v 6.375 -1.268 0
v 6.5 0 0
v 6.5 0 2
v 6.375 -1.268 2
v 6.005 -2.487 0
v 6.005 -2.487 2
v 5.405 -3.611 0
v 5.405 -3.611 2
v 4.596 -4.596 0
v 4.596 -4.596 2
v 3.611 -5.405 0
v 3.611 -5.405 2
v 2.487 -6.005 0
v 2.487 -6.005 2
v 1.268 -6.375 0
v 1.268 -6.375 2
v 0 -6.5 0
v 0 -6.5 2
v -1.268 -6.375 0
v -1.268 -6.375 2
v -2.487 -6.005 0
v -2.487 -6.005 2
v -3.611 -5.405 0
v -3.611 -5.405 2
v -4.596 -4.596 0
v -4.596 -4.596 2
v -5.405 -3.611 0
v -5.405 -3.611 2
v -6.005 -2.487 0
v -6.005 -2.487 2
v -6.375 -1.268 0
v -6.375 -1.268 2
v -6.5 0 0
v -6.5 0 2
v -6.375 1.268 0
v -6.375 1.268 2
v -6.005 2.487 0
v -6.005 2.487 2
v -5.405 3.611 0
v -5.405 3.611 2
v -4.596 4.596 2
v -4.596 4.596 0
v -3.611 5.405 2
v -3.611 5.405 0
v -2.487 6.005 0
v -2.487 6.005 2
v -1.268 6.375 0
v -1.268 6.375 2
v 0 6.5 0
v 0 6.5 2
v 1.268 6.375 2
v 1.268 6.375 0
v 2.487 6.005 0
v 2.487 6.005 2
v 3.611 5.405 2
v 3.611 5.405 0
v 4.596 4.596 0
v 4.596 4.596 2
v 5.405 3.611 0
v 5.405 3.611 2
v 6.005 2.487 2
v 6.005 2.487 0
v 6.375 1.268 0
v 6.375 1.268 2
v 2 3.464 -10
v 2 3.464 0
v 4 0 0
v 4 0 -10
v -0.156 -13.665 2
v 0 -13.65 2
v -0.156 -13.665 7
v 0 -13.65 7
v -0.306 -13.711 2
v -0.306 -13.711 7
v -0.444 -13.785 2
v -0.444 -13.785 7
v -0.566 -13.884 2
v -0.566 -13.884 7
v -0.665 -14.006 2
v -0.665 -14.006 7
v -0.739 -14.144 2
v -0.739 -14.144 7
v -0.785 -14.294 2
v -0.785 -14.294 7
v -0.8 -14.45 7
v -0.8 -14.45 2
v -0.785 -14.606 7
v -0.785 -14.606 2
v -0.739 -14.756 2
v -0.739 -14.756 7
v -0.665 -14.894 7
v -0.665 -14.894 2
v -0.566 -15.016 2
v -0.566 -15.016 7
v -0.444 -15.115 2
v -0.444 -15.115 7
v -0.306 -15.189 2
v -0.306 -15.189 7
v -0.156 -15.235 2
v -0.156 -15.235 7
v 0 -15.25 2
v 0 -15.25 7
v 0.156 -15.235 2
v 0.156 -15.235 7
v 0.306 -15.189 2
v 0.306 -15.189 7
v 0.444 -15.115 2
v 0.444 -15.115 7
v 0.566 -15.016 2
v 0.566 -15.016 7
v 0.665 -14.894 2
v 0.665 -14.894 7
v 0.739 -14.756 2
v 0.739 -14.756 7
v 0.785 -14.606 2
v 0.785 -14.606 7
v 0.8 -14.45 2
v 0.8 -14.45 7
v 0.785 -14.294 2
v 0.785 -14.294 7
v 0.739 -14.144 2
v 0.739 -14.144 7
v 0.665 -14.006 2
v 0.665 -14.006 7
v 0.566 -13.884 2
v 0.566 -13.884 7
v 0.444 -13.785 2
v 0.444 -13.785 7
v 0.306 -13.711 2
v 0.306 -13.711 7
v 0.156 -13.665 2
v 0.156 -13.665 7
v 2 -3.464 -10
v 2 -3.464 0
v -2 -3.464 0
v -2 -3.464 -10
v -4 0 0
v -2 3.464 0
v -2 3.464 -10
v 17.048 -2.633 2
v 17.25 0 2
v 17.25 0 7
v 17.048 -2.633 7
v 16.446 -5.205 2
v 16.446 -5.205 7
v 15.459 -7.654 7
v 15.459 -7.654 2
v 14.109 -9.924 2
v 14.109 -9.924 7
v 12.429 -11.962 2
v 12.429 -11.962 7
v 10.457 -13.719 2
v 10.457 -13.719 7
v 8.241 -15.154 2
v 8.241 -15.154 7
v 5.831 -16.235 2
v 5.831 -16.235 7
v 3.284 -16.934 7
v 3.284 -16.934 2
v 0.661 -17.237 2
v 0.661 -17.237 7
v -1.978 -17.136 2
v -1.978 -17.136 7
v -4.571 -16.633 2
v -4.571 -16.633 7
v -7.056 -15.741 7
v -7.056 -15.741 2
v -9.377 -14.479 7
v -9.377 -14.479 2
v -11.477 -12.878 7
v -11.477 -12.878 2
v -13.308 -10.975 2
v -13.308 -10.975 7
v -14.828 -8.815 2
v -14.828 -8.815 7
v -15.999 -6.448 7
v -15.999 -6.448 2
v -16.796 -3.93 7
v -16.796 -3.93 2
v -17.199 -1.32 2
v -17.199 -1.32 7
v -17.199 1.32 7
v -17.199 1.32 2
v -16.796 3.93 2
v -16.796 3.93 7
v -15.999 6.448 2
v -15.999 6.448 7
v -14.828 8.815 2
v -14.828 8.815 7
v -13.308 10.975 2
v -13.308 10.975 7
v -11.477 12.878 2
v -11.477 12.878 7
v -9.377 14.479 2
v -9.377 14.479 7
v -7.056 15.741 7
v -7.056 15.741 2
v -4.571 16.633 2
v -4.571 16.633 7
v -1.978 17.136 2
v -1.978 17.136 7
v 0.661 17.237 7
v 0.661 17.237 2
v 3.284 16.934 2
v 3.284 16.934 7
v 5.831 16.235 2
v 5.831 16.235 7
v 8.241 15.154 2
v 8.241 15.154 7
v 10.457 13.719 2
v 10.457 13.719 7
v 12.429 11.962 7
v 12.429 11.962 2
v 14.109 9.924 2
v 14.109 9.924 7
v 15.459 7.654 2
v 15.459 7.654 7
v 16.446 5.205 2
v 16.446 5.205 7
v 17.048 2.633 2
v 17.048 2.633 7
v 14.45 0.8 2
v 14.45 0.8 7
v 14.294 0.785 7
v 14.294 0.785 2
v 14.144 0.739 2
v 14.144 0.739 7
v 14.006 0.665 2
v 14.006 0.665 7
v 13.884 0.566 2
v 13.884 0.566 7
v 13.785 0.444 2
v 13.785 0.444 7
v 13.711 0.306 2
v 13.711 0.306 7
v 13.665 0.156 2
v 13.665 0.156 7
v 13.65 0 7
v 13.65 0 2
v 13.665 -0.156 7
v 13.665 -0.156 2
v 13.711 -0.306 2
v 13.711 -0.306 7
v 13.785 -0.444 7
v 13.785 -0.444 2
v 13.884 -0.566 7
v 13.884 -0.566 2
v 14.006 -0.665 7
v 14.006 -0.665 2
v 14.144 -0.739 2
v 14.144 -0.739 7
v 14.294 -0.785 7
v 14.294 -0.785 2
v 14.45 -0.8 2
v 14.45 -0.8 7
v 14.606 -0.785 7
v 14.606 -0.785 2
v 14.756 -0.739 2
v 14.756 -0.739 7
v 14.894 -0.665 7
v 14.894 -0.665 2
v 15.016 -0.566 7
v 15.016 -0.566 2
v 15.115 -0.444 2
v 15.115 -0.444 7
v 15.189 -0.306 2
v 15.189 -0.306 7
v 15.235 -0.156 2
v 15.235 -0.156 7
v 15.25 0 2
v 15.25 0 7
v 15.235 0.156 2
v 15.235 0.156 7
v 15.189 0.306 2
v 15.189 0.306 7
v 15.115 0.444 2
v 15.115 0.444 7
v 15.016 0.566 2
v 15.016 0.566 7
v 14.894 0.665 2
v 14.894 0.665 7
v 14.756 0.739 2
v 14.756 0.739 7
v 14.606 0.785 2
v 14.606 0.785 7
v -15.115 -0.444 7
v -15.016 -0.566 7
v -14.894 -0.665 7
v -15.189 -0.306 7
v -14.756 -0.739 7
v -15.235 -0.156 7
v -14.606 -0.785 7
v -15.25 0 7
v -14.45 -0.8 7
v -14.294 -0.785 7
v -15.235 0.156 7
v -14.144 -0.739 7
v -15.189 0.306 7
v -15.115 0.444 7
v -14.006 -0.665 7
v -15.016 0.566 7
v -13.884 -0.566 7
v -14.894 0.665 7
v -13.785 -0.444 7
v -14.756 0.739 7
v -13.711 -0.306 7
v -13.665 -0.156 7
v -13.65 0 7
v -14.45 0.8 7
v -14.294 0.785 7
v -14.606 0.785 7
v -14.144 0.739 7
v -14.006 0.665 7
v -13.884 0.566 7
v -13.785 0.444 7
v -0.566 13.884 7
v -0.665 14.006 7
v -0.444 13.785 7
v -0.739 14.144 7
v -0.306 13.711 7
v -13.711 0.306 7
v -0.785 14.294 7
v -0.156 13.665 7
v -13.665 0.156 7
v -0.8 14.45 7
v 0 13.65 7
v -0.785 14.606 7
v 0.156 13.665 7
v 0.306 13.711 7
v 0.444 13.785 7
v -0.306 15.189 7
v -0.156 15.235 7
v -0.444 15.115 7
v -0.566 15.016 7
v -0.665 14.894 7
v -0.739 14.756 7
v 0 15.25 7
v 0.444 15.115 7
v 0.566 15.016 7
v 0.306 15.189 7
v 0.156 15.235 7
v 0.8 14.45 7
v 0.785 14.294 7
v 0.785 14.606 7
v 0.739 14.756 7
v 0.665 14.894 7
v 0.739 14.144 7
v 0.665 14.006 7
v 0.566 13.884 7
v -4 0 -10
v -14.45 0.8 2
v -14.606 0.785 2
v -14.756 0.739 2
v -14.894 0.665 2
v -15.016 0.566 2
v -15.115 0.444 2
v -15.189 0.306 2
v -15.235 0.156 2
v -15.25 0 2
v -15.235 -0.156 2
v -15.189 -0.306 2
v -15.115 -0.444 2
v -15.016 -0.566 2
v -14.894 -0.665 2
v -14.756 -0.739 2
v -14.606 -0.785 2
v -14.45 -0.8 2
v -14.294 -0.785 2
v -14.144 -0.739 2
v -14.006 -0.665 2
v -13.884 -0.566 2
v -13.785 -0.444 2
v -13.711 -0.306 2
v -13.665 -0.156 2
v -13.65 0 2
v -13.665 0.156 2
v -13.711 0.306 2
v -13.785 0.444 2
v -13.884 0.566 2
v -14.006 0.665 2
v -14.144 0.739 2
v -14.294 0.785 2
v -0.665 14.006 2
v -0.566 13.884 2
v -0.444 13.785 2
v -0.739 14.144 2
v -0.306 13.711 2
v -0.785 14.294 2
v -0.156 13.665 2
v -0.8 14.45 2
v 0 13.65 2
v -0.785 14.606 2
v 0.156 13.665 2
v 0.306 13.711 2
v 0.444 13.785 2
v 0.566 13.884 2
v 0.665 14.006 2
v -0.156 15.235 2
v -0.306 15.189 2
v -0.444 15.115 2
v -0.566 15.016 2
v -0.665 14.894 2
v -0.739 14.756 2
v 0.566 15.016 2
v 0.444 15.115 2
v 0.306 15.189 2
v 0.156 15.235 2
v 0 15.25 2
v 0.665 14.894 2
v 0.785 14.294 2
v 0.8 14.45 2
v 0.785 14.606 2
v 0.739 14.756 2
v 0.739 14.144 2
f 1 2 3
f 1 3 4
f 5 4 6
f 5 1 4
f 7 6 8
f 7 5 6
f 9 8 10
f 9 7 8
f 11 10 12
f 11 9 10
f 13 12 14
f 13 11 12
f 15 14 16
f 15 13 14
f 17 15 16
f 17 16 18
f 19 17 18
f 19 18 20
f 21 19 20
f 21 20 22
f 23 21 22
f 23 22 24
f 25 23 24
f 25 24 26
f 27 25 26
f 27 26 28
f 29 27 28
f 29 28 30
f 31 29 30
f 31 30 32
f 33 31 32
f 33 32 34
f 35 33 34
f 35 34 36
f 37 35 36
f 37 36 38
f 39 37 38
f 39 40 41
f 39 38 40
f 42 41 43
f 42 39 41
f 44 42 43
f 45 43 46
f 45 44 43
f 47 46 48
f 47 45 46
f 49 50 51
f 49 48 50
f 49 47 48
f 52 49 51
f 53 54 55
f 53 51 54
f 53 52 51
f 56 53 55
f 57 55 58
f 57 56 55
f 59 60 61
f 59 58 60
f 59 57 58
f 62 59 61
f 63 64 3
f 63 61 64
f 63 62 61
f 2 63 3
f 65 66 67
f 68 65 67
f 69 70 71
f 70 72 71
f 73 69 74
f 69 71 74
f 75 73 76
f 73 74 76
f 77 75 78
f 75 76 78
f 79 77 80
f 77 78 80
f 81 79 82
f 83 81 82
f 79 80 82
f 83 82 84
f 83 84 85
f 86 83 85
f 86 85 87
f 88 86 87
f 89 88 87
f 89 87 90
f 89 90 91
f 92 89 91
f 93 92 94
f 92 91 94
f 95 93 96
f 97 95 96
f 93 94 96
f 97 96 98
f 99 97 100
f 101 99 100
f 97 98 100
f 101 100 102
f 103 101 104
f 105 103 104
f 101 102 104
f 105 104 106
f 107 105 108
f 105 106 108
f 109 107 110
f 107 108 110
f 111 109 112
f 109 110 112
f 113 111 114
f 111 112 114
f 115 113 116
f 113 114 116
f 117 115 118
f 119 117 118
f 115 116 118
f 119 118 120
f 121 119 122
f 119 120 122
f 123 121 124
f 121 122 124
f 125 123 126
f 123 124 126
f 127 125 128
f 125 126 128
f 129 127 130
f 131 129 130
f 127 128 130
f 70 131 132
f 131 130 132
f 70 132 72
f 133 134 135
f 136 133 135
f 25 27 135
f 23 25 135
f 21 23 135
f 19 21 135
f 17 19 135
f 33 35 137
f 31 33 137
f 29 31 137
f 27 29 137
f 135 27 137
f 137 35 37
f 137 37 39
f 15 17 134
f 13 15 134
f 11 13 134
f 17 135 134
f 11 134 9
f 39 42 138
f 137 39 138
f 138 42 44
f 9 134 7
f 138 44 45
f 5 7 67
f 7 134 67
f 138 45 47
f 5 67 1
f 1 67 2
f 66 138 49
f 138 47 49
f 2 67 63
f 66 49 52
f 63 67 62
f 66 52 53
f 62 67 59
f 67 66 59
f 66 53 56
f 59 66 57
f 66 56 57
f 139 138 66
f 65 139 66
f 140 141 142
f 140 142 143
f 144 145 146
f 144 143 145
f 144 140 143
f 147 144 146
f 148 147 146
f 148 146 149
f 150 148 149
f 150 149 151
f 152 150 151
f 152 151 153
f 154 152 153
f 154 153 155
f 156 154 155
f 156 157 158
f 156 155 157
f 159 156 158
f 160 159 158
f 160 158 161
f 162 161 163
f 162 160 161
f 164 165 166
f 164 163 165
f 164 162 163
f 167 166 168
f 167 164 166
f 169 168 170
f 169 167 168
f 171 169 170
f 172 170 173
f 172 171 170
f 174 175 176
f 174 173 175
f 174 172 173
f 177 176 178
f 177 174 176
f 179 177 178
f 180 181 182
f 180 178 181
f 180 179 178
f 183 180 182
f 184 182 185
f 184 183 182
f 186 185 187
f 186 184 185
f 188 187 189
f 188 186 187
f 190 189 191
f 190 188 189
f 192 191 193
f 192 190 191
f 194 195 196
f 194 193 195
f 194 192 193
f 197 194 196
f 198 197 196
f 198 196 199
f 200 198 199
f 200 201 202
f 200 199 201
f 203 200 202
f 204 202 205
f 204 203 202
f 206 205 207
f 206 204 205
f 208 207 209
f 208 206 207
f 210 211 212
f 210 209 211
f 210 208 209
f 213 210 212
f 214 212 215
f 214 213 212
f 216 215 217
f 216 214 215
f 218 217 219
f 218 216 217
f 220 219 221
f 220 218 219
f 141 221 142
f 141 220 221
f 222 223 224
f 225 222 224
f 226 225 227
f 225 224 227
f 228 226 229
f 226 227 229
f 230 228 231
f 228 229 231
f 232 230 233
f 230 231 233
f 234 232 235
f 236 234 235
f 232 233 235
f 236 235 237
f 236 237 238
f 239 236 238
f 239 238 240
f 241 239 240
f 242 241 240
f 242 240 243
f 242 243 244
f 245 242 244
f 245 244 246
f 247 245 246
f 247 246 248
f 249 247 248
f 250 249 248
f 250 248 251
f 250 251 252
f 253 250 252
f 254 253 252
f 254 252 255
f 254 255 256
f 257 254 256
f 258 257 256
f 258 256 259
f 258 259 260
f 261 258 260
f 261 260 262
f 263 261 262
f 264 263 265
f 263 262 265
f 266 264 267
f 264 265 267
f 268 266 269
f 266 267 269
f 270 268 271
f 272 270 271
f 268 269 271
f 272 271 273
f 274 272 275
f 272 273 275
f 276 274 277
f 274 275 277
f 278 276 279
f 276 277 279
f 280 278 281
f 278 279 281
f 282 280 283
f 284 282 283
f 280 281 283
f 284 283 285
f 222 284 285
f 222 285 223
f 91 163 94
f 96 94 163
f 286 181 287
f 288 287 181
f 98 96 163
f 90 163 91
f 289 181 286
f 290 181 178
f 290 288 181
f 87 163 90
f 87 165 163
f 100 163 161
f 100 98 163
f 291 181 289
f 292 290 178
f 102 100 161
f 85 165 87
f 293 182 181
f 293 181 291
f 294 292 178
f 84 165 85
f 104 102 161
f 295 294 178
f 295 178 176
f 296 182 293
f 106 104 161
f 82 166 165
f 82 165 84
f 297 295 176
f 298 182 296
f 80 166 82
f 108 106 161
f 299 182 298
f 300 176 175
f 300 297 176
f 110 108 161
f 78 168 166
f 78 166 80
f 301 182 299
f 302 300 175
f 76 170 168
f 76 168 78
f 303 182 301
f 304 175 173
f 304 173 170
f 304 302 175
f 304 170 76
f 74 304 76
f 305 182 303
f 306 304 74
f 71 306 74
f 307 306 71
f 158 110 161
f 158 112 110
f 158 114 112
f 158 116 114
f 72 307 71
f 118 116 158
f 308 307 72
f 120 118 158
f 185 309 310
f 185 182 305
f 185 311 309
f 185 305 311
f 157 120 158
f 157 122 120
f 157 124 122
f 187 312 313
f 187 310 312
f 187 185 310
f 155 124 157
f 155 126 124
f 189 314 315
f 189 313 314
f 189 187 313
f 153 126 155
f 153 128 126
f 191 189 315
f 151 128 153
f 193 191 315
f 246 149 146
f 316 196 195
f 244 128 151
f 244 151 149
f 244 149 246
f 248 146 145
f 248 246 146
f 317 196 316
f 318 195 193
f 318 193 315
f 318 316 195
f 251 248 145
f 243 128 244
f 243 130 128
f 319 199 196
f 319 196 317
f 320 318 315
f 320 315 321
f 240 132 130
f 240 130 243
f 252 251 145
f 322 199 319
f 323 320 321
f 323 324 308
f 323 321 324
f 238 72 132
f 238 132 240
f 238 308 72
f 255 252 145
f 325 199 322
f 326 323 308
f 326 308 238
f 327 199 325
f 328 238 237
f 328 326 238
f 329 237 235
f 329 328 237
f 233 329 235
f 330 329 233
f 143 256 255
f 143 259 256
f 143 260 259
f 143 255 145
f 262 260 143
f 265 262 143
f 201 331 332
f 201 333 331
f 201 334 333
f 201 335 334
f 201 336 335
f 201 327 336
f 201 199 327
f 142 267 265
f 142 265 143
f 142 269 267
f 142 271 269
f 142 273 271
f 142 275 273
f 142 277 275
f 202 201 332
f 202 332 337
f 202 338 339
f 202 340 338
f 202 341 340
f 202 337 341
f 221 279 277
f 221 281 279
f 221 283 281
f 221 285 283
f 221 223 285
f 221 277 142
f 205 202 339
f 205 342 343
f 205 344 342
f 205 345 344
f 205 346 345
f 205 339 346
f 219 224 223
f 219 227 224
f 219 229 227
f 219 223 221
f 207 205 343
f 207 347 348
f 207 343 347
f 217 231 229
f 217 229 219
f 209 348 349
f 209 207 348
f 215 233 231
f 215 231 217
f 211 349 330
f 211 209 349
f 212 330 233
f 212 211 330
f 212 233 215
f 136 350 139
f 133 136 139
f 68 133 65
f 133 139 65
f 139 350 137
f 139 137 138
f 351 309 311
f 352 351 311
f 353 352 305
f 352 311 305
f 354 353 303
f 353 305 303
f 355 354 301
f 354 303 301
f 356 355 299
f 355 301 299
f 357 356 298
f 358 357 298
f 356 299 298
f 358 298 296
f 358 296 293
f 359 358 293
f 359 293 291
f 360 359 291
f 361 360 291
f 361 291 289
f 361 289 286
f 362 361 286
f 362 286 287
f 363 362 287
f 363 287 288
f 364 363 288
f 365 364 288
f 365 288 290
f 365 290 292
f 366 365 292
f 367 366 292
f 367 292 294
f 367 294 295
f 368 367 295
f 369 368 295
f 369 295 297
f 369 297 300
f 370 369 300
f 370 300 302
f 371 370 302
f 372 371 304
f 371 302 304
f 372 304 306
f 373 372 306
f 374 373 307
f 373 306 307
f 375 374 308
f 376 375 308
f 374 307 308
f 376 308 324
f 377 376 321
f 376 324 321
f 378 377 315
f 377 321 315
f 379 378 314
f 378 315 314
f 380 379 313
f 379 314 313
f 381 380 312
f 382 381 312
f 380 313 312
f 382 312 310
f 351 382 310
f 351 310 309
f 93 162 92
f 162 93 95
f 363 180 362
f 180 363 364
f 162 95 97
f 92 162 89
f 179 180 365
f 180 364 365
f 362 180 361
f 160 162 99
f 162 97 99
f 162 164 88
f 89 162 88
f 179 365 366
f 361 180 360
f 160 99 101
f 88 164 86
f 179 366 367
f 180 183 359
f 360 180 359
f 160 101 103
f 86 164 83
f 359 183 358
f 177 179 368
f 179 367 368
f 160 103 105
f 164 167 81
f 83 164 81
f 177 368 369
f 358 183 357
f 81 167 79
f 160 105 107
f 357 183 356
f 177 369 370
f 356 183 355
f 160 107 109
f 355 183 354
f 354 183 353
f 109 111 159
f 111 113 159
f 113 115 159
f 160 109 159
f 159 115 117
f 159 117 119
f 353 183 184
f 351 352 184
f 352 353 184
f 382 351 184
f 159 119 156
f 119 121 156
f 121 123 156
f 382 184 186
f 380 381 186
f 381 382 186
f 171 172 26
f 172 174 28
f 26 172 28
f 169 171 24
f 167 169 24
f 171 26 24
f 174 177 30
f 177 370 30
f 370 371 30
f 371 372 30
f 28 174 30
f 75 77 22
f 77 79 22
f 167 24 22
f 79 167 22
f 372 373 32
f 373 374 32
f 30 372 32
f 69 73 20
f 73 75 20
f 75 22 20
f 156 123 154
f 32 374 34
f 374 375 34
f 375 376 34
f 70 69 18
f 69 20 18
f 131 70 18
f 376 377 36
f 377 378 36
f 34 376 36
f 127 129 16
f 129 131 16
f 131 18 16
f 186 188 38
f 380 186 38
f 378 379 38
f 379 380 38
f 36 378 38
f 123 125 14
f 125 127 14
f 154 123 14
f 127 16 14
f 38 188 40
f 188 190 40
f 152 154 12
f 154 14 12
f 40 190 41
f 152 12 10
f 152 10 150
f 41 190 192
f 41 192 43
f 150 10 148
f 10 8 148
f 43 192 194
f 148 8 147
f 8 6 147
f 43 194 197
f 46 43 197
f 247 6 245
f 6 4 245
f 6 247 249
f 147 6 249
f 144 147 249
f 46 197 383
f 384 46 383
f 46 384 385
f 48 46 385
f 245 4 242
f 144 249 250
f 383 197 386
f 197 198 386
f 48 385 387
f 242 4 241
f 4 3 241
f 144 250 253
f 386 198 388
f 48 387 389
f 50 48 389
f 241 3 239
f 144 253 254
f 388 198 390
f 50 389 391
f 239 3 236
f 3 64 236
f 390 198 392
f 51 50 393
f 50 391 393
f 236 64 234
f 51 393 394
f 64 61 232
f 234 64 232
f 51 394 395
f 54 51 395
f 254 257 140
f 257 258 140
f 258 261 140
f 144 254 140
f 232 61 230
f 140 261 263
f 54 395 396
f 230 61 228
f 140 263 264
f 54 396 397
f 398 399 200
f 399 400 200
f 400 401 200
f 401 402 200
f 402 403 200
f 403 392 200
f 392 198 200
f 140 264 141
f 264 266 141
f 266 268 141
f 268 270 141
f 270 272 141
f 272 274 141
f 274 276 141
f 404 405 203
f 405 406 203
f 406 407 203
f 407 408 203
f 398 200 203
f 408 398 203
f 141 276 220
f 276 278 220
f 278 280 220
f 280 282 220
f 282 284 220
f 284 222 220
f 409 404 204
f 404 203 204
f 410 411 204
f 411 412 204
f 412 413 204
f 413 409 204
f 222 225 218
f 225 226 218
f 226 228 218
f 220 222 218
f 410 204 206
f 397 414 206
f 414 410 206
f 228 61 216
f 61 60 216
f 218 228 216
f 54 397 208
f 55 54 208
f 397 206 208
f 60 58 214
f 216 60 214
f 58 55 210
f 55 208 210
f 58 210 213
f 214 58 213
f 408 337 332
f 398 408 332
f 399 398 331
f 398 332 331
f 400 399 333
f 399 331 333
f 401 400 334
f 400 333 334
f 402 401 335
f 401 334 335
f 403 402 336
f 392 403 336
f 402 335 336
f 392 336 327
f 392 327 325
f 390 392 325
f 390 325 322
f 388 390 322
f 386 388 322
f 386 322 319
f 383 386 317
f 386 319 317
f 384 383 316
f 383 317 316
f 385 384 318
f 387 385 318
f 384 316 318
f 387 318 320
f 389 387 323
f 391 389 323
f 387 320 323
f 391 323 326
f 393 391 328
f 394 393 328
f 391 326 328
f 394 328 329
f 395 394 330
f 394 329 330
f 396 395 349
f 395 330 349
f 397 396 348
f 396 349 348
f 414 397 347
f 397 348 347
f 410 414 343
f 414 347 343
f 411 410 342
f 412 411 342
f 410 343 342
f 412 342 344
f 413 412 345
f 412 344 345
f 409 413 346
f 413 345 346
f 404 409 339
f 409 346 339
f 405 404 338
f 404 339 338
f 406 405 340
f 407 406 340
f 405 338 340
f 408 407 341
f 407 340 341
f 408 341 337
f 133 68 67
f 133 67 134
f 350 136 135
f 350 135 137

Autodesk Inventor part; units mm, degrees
ref_plane "YZ Plane" through (0, 0, 0) normal (1, 0, 0) x (0, 1, 0)
ref_plane "XZ Plane" through (0, 0, 0) normal (0, 1, 0) x (-1, 0, 0)
sketch "Sketch1" plane through (0, 0, 0) normal (0, 0, 1) x (1, 0, 0)
  line L0 (-2, 3.4641) -> (2, 3.4641) projected
  line L1 (-4, 0) -> (-2, 3.4641) projected
  line L2 (-2, -3.4641) -> (-4, 0) projected
  line L3 (2, -3.4641) -> (-2, -3.4641) projected
  line L4 (4, 0) -> (2, -3.4641) projected
  line L5 (2, 3.4641) -> (4, 0) projected
  line L6 (-4, 0) -> (-2, 3.4641) projected
  line L7 (-2, 3.4641) -> (2, 3.4641) projected
  line L8 (2, 3.4641) -> (4, 0) projected
  line L9 (4, 0) -> (2, -3.4641) projected
  line L10 (2, -3.4641) -> (-2, -3.4641) projected
  line L11 (-2, -3.4641) -> (-4, 0) projected
  circle A0 centre (0, 0) radius 7.5 projected
  circle A1 centre (0, 0) radius 6.5
  point P0 (0, 0)
  dimension "d0" = 1
extrude "Extrusion1" add sketch "Sketch1" against normal blind 10 contours L0 L5 L4 L3 L2 L1
ref_plane "Work Plane2" through (0, 0, 0) normal (0, 0, 1) x (1, 0, 0)
sketch "Sketch3" plane through (0, 0, 0) normal (0, 0, 1) x (1, 0, 0)
  circle A0 centre (0, 0) radius 6.5 projected
  point P0 (0, 0)
extrude "Extrusion2" add sketch "Sketch3" along normal blind 2
sketch "Sketch4" plane through (0, 0, 2) normal (0, 0, 1) x (1, 0, 0)
  circle A0 centre (0, 0) radius 17.25
  circle A1 centre (0, 0) radius 14.45 construction
  point P0 (14.45, 0)
  point P1 (-14.45, 0)
  point P2 (0, 14.45)
  point P3 (0, -14.45)
  dimension "d5" = 34.5
  dimension "d6" = 28.9
extrude "Extrusion3" add sketch "Sketch4" along normal blind 5
hole "Hole1" at (14.45, 0, 2) at (-14.45, 0, 2) at (0, 14.45, 2) at (0, -14.45, 2) direction (0, 0, 1) diameter 1.6 end through all
properties part number "Exagono"
